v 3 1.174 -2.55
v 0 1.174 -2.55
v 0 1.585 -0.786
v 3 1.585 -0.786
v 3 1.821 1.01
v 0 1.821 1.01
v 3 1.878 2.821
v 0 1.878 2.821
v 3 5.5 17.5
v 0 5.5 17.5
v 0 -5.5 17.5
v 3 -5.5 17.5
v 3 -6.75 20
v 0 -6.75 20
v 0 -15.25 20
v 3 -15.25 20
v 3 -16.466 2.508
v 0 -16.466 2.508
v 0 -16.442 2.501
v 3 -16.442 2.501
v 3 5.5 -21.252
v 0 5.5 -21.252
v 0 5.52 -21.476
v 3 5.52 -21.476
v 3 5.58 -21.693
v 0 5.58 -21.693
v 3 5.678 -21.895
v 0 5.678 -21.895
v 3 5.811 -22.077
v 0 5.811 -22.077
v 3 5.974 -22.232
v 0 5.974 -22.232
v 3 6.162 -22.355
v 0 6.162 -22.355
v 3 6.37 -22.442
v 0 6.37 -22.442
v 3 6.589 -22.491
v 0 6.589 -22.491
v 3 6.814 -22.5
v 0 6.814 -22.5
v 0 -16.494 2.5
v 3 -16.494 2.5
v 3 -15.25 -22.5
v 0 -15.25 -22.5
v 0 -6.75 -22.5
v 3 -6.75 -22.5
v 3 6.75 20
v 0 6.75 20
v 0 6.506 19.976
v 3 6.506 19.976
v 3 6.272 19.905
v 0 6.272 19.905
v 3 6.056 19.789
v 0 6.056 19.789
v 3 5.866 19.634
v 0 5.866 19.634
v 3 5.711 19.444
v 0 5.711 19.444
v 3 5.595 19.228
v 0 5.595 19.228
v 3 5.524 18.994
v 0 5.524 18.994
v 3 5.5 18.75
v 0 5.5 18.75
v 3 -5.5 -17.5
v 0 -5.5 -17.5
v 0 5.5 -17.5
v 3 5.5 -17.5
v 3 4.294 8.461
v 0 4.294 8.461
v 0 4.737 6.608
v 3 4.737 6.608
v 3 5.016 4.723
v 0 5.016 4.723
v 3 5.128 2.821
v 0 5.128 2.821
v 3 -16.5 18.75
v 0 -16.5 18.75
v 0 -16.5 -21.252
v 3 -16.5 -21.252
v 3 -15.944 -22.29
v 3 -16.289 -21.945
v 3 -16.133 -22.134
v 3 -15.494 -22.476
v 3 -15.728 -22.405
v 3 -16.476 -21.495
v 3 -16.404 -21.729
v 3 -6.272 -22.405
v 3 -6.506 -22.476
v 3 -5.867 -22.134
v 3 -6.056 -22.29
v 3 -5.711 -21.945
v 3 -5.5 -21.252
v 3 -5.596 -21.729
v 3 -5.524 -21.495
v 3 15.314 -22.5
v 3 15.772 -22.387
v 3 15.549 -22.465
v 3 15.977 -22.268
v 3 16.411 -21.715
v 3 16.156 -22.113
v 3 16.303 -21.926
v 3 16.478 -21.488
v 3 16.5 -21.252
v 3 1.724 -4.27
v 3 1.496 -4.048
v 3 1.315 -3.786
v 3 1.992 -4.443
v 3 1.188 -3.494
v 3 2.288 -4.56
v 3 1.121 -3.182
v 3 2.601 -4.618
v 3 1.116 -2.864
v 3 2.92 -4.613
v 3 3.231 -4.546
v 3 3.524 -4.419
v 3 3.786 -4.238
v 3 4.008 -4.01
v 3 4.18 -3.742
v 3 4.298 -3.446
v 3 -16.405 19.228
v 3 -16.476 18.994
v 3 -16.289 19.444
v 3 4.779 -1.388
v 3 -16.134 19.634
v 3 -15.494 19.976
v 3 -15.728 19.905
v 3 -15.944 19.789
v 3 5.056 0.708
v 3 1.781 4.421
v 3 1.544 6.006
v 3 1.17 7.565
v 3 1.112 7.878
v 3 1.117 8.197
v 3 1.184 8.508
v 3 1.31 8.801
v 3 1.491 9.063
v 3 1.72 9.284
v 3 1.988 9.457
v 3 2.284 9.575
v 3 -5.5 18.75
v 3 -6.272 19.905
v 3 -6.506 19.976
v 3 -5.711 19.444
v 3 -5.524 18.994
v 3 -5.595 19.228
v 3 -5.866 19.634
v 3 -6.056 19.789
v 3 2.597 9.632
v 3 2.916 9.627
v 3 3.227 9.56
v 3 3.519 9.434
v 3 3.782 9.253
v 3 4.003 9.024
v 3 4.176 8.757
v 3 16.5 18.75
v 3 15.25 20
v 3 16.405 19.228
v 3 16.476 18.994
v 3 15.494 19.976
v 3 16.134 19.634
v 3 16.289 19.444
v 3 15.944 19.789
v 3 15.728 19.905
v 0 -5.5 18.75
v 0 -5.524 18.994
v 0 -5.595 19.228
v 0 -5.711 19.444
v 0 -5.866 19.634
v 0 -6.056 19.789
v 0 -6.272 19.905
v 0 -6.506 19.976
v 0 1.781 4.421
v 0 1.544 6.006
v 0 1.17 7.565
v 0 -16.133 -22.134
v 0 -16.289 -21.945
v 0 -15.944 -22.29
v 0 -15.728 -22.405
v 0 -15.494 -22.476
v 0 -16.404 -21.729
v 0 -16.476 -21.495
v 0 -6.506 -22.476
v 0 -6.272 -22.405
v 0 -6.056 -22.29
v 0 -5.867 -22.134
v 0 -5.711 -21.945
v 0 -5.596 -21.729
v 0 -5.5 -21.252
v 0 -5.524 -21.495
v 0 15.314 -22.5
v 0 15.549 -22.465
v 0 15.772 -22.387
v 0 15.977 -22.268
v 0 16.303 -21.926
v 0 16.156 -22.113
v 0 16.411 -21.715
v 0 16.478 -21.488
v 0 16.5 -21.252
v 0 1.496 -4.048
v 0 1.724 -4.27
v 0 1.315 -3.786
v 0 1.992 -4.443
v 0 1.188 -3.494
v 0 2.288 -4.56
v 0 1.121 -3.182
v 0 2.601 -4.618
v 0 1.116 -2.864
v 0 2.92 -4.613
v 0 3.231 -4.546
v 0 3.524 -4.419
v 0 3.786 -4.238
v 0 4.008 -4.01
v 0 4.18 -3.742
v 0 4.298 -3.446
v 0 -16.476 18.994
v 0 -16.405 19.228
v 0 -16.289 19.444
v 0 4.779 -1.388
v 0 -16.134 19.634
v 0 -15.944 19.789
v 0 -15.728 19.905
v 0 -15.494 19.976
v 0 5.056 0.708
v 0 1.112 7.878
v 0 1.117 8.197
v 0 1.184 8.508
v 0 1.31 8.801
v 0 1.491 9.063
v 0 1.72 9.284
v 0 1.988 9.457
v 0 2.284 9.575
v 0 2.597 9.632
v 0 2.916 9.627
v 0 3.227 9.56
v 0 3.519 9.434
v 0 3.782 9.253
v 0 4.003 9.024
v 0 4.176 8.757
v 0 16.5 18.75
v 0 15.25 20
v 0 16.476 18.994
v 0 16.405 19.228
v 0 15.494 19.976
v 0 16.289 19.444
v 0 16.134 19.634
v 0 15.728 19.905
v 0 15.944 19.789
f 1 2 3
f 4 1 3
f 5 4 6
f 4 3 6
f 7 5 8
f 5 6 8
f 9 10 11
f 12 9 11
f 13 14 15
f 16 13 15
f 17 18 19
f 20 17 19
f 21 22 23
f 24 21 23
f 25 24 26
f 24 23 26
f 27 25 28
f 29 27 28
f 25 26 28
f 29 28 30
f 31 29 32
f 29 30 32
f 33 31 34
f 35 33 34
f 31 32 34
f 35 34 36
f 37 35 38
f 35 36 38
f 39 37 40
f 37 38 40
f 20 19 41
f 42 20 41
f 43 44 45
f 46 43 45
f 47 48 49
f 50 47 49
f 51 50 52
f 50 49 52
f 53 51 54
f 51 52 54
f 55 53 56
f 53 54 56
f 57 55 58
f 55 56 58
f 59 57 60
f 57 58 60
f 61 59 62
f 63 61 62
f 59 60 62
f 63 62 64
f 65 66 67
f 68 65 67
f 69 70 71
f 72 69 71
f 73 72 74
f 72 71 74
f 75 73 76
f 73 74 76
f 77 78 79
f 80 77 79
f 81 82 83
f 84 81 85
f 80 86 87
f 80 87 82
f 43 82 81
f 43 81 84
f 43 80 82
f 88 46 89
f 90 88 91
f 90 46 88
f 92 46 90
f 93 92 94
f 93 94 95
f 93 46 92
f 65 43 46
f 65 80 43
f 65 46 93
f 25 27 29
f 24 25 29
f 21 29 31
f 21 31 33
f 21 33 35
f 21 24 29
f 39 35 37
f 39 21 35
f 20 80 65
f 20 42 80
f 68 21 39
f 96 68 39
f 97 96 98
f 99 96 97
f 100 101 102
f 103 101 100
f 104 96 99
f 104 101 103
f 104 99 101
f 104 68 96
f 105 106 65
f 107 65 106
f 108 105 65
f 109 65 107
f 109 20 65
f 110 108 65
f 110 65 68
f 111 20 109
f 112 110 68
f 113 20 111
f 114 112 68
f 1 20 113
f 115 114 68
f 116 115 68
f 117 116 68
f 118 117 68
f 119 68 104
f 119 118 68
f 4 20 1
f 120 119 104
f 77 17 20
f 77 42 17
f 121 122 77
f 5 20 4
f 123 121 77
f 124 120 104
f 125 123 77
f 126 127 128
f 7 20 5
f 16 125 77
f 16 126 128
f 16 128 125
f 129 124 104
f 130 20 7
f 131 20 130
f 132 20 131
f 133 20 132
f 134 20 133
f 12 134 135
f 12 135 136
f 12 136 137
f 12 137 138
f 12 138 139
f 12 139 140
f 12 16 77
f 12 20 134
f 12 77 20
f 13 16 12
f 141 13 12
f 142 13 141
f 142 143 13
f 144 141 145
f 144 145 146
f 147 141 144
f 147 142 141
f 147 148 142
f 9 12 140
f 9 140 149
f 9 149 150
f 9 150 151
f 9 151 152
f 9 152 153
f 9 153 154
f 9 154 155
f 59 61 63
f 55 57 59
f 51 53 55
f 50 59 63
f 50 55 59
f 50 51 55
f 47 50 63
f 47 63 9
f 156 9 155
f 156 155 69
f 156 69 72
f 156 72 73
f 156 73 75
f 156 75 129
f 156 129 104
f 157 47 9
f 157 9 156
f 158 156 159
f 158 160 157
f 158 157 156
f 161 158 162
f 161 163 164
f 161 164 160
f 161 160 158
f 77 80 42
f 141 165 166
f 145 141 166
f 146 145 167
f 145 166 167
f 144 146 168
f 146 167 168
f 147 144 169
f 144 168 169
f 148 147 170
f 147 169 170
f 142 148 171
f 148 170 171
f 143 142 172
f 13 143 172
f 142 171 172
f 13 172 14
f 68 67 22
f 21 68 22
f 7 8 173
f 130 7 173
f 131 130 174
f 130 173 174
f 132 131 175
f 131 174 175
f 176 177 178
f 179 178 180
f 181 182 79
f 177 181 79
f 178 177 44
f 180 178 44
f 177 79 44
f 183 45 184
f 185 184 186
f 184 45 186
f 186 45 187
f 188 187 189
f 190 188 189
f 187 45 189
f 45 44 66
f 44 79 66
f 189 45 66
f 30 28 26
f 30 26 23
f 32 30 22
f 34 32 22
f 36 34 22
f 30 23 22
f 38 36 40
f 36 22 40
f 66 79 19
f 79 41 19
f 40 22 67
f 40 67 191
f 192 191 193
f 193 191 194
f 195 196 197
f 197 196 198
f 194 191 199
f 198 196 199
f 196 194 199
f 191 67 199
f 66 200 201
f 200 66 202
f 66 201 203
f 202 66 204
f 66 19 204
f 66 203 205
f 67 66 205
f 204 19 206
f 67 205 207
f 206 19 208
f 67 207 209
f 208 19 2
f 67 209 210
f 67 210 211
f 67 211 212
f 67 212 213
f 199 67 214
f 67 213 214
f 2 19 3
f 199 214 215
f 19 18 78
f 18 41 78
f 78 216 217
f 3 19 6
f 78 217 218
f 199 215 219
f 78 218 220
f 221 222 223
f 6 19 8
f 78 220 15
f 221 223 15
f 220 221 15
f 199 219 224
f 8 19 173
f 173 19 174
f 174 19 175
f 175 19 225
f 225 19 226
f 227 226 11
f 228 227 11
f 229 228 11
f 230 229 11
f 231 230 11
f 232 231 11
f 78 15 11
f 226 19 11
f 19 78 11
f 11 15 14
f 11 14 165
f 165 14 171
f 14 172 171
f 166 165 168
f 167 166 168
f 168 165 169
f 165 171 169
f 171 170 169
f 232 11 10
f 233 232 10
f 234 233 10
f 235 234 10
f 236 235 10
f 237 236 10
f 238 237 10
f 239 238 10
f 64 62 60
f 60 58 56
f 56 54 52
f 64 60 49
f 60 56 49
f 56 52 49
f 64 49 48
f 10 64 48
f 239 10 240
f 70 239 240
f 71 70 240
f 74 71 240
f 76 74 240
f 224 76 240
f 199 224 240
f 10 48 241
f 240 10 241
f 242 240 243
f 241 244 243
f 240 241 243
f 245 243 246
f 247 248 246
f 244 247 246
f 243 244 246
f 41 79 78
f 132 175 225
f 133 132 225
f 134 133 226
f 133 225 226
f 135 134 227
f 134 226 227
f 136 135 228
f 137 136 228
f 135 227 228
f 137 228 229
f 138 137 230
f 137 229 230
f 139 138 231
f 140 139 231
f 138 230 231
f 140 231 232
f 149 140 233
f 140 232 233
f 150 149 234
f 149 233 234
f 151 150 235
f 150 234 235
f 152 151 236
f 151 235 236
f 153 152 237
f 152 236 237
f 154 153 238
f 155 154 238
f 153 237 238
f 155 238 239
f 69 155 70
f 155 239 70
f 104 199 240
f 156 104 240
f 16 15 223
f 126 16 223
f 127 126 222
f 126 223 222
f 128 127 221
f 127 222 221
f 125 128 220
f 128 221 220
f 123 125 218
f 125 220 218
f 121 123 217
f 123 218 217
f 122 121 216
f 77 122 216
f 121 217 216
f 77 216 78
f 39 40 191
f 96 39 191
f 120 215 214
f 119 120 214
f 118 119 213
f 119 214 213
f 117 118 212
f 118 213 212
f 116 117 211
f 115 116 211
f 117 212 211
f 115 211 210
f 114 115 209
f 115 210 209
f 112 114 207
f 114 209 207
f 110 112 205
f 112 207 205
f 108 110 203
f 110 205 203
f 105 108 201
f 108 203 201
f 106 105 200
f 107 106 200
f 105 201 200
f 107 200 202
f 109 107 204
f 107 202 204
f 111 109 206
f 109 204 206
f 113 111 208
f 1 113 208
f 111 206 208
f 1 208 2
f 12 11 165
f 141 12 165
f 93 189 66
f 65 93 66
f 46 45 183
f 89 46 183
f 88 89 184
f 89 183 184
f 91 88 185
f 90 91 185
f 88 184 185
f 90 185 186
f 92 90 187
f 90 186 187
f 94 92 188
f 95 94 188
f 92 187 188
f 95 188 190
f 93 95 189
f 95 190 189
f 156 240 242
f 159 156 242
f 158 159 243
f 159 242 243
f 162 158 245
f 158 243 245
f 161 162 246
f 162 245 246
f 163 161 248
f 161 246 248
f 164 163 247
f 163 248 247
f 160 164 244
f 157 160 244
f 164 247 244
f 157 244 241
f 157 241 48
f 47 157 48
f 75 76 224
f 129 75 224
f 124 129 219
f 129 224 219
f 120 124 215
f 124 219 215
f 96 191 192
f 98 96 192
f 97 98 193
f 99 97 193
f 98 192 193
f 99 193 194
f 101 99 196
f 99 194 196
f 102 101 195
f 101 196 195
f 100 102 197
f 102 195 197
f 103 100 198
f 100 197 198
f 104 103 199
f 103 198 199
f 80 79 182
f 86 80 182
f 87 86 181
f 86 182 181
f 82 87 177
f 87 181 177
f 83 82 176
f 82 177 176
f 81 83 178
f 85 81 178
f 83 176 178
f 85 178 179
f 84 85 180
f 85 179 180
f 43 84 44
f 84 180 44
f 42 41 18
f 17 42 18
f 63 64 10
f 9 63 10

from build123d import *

# Parameters (mm, degrees)
F1_DEPTH = 3


# Not quite as in the source:
# - ends of sketch curves that miss each other by under 0.0002 mm in the source are joined


with BuildPart() as f1:
    # F0 (on Right) → F1 (new body)
    with BuildSketch(Plane.YZ):
        Polygon((5.5, 17.5), (-5.5, 17.5), (-16.5, 17.5), (-16.5, -17.5), (-5.5, -17.5), (5.5, -17.5), (16.5, -17.5), (16.5, 17.5), align=None)
        with BuildLine():
            Line((-16.4417464987, 2.5009048043), (-16.4935827024, 2.5))
            Line((-16.4935827024, 2.5), (-16.4660868868, 2.5078842983))
            Line((-16.4660868868, 2.5078842983), (1.1696009604, 7.5648364131))
            ThreePointArc((1.1696009604, 7.5648364131), (2.2837405131, 9.5747973722), (4.2937014722, 8.4606578195))
            ThreePointArc((4.2937014722, 8.4606578195), (4.8975775667, 5.6682772997), (5.1283712007, 2.8206836482))
            ThreePointArc((5.1283712007, 2.8206836482), (4.9431713186, -0.3431878735), (4.2978712002, -3.4460848682))
            ThreePointArc((4.2978712002, -3.4460848682), (2.2879051371, -4.5602229624), (1.1737655844, -2.5502620033))
            Line((1.1737655844, -2.5502620033), (-16.4417464987, 2.5009048043))
        make_face(mode=Mode.SUBTRACT)
        with BuildLine():
            Line((-5.5, -17.5), (-16.5, -17.5))
            Line((-16.5, -17.5), (-16.5, -21.2516473165))
            ThreePointArc((-16.5, -21.2516473165), (-16.1333008707, -22.1344656985), (-15.25, -22.5))
            Line((-15.25, -22.5), (-6.75, -22.5))
            ThreePointArc((-6.75, -22.5), (-5.8666991293, -22.1344656985), (-5.5000010855, -21.251647315))
            Line((-5.5000010855, -21.251647315), (-5.5, -17.5))
        make_face()
        with BuildLine():
            Line((16.5, -21.2516473165), (16.5, -17.5))
            Line((16.5, -17.5), (5.5, -17.5))
            Line((5.5, -17.5), (5.5, -21.251647316))
            ThreePointArc((5.5, -21.251647316), (5.8890966799, -22.1579284387), (6.8141527576, -22.5))
            Line((6.8141527576, -22.5), (15.3141527576, -22.5))
            ThreePointArc((15.3141527576, -22.5), (16.1562811226, -22.1125506362), (16.5, -21.2516473165))
        make_face()
        with BuildLine():
            Line((5.5, 18.75), (5.5, 17.5))
            Line((5.5, 17.5), (16.5, 17.5))
            Line((16.5, 17.5), (16.5, 18.75))
            ThreePointArc((16.5, 18.75), (16.1338834765, 19.6338834765), (15.25, 20))
            Line((15.25, 20), (6.75, 20))
            ThreePointArc((6.75, 20), (5.8661165235, 19.6338834765), (5.5, 18.75))
        make_face()
        with BuildLine():
            Line((-16.5, 17.5), (-5.5, 17.5))
            Line((-5.5, 17.5), (-5.5, 18.75))
            ThreePointArc((-5.5, 18.75), (-5.8661165235, 19.6338834765), (-6.75, 20))
            Line((-6.75, 20), (-15.25, 20))
            ThreePointArc((-15.25, 20), (-16.1338834765, 19.6338834765), (-16.5, 18.75))
            Line((-16.5, 18.75), (-16.5, 17.5))
        make_face()
        with BuildLine():
            Line((-16.4660868868, 2.5078842983), (-16.4417464987, 2.5009048043))
            Line((-16.4417464987, 2.5009048043), (1.8783712007, 2.8206836482))
            ThreePointArc((1.8783712007, 2.8206836482), (1.6794064974, 5.2159796384), (1.1696009604, 7.5648364131))
            Line((1.1696009604, 7.5648364131), (-16.4660868868, 2.5078842983))
        make_face()
        with BuildLine():
            Line((1.8783712007, 2.8206836482), (-16.4417464987, 2.5009048043))
            Line((-16.4417464987, 2.5009048043), (1.1737655844, -2.5502620033))
            ThreePointArc((1.1737655844, -2.5502620033), (1.7250108073, 0.1091116575), (1.8783712007, 2.8206836482))
        make_face()
    extrude(amount=F1_DEPTH)


solid = f1.part
